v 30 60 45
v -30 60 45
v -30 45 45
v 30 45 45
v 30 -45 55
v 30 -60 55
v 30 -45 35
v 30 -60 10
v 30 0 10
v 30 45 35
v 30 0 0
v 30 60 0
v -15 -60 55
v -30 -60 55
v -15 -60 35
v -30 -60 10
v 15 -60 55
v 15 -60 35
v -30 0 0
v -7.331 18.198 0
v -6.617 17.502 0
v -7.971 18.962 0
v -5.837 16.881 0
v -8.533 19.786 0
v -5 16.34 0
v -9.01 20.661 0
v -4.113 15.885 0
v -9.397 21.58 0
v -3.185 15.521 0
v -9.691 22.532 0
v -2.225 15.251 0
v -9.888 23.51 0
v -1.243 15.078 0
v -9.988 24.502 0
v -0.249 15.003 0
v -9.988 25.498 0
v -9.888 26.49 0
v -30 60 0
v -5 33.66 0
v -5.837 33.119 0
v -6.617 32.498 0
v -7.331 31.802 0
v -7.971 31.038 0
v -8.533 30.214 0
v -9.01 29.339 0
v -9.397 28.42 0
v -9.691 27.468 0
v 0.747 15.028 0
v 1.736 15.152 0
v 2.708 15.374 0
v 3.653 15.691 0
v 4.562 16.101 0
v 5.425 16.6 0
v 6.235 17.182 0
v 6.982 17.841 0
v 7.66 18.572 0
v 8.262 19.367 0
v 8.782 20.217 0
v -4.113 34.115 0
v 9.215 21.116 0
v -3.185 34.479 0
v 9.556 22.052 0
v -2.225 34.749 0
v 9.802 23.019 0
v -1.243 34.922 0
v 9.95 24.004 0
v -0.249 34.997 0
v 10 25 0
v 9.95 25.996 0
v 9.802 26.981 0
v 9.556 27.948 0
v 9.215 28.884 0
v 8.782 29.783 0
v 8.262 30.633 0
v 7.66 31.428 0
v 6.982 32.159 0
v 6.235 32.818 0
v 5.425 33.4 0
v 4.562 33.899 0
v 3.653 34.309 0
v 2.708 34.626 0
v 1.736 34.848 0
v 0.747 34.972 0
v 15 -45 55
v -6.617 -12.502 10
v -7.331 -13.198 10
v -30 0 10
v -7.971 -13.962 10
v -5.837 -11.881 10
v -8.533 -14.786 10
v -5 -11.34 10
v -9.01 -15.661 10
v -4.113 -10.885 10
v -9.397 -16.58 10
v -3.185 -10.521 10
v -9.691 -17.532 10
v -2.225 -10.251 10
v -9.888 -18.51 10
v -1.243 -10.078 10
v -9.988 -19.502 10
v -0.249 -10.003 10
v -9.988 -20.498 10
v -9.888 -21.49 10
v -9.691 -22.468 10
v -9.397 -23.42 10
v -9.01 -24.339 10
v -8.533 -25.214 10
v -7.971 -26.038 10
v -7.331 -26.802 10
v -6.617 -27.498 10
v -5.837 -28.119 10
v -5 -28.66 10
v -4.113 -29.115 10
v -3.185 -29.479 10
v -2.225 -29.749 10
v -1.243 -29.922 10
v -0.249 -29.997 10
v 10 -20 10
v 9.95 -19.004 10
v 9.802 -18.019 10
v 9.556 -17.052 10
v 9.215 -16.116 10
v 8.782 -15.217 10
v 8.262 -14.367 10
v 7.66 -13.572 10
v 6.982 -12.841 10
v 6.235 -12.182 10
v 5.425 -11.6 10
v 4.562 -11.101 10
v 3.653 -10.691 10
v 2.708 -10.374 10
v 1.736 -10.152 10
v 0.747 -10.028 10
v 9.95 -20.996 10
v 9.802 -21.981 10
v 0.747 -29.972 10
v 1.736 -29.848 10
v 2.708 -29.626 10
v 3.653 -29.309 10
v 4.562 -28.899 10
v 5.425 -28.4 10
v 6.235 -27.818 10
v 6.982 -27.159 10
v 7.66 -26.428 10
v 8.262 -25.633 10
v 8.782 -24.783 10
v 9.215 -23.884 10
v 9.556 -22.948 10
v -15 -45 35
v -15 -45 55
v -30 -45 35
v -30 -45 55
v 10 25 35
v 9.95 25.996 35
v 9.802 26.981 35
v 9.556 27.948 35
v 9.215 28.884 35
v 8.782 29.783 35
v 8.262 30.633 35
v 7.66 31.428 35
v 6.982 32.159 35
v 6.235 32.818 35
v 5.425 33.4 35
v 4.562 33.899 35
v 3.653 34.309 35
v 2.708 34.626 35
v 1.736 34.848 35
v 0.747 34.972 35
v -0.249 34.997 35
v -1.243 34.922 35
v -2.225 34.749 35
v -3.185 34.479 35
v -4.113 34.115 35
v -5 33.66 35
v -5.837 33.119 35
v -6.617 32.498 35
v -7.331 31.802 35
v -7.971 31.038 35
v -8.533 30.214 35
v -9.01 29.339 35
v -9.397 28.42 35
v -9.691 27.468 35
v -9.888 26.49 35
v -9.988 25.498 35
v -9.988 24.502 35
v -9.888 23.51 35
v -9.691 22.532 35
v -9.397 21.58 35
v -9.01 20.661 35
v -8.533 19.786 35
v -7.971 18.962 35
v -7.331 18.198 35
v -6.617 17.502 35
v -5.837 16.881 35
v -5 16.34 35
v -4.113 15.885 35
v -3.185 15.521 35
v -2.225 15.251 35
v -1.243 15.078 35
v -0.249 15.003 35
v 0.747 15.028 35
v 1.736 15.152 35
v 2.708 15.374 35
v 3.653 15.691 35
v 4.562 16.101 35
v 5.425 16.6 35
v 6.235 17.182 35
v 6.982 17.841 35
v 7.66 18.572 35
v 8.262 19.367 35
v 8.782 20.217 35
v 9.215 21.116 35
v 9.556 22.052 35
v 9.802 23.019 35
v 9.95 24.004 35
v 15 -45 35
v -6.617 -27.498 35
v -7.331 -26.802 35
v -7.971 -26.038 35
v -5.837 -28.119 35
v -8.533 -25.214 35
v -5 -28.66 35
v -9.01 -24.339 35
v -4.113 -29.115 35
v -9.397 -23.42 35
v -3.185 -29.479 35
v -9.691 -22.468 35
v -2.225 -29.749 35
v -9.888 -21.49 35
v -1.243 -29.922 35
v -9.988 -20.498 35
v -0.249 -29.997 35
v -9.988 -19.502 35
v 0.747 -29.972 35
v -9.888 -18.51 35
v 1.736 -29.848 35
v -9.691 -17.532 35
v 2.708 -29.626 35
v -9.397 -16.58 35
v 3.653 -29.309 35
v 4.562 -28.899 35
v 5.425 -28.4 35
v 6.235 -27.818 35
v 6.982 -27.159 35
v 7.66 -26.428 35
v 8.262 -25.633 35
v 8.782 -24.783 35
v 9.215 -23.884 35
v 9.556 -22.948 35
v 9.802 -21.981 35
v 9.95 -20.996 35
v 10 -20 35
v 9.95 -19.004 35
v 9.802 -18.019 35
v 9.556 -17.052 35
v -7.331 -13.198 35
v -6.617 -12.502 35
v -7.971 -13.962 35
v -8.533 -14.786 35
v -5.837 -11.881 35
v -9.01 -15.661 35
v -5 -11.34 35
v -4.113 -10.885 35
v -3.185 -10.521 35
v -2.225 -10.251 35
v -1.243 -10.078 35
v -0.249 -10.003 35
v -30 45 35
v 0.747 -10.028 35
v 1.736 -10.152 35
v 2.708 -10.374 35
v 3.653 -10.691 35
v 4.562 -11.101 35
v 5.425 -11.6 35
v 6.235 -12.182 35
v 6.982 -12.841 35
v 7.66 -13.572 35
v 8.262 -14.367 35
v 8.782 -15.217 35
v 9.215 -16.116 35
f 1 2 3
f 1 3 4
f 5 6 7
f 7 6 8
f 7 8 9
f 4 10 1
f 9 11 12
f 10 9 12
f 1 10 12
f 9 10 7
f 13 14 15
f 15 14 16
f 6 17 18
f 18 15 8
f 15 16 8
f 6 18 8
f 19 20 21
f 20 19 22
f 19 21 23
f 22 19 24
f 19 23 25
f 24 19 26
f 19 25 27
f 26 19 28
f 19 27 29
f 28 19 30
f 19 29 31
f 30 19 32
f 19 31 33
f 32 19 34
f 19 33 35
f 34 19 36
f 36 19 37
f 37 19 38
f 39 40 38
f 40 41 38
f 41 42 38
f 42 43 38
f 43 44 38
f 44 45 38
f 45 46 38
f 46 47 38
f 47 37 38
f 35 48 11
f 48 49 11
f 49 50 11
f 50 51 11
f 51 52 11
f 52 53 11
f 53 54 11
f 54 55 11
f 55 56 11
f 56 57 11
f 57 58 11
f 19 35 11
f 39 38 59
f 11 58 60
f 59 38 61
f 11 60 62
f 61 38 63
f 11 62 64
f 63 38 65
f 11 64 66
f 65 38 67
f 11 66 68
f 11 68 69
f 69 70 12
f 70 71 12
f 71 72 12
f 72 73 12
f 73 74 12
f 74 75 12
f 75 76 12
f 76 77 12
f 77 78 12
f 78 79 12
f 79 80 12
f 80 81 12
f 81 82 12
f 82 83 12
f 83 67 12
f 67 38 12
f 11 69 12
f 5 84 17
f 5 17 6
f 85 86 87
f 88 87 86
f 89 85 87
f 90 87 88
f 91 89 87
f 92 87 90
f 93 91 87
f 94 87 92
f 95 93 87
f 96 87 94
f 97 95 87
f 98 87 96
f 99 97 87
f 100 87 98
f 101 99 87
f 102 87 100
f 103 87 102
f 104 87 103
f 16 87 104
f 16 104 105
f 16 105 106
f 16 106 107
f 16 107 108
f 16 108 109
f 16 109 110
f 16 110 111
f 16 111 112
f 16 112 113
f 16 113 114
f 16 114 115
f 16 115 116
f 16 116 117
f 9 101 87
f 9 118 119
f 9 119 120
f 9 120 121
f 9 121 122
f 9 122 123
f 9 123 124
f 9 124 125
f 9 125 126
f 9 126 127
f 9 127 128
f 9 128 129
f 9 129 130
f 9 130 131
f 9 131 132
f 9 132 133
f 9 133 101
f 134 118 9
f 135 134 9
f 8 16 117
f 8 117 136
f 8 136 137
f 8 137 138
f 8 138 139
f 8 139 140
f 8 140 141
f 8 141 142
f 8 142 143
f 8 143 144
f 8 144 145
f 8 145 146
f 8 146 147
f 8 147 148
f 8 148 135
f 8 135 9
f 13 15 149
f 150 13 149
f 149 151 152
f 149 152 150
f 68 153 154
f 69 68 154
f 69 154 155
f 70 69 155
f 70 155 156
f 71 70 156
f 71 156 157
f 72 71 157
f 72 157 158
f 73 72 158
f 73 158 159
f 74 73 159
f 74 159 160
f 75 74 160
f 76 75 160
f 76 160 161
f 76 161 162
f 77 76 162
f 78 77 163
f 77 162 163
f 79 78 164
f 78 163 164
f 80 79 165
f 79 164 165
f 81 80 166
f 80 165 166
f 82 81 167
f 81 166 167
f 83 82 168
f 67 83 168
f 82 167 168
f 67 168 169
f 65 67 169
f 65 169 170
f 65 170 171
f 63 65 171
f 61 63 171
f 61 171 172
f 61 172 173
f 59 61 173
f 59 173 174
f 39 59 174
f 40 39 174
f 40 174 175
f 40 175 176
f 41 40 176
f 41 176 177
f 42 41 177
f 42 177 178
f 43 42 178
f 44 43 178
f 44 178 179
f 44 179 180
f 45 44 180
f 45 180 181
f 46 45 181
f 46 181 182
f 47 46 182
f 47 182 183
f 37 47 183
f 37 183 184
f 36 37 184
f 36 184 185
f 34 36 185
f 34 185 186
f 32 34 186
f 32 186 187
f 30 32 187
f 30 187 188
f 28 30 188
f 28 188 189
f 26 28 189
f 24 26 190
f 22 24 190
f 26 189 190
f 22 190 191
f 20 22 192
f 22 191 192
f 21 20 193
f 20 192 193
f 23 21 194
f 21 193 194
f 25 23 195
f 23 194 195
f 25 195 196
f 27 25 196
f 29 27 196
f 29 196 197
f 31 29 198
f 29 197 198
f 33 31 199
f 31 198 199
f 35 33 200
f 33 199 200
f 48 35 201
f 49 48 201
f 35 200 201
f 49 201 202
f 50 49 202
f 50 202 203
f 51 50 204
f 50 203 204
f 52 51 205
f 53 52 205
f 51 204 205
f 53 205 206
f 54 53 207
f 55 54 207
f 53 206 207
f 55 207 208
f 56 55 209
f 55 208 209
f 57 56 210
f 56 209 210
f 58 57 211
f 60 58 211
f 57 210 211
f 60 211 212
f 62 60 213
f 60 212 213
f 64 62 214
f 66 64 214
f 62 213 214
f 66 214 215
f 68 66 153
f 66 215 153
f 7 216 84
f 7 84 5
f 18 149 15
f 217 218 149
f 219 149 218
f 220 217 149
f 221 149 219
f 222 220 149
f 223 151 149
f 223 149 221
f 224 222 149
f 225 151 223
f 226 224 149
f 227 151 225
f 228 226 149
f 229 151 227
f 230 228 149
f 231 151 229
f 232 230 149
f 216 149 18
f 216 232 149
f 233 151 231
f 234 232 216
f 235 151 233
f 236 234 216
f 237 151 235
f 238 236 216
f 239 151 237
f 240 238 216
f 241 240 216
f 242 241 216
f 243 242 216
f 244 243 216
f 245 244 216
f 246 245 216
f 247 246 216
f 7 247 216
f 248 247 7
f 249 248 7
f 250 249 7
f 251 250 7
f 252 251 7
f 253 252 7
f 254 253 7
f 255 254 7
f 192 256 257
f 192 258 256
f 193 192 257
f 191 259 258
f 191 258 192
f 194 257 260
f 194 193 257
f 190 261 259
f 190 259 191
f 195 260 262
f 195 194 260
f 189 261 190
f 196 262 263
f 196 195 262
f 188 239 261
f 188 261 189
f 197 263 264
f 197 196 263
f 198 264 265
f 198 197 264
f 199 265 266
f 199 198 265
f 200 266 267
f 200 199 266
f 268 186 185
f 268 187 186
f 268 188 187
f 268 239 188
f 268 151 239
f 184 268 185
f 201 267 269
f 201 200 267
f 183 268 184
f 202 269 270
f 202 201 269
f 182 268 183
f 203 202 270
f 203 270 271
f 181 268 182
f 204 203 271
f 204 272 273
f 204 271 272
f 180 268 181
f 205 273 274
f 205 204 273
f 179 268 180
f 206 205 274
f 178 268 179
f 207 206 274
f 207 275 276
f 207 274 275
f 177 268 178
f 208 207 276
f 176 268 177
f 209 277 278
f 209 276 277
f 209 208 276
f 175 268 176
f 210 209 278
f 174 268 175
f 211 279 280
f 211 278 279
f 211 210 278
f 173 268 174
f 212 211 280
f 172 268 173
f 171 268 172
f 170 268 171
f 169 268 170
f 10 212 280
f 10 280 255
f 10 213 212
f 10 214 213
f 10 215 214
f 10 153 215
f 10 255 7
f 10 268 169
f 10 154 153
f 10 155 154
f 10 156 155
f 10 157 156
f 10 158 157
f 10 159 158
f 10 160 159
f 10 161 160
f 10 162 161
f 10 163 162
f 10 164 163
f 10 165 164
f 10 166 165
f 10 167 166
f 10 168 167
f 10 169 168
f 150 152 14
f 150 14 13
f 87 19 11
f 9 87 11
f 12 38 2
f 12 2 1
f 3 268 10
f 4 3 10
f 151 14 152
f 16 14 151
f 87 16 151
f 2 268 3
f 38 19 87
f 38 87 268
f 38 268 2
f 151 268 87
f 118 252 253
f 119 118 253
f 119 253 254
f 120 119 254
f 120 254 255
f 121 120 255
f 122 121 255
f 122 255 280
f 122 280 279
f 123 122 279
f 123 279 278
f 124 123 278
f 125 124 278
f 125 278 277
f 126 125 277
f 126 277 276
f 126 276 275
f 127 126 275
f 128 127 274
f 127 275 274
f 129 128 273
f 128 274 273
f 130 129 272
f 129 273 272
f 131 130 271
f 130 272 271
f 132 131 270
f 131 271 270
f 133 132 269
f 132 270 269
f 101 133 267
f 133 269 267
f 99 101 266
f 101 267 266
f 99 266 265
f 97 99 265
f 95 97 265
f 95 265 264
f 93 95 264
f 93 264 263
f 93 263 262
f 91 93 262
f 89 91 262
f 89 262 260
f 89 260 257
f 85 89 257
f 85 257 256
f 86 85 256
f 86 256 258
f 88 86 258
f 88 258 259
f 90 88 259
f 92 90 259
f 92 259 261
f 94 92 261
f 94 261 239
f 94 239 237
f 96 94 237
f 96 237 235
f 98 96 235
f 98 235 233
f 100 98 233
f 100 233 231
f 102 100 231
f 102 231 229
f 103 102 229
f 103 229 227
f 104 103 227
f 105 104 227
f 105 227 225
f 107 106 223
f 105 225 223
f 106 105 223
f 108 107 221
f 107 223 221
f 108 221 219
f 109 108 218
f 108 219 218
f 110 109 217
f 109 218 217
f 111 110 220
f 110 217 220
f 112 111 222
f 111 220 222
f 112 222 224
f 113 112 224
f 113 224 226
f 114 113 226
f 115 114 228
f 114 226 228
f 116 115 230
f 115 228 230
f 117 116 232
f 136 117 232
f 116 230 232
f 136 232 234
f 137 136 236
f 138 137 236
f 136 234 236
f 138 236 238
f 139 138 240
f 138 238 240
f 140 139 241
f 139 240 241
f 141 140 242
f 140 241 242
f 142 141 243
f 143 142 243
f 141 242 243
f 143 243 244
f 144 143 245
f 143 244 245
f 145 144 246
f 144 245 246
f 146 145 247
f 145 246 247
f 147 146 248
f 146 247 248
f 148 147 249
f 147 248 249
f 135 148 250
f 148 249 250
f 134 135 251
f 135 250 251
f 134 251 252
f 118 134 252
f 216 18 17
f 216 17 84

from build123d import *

# Parameters (mm, degrees)
F0_W      = 60
F0_H      = 120
F1_DEPTH  = 35
F2_W      = 60
F2_H      = 15
F3_DEPTH  = 10
F4_W      = 60
F4_H      = 60
F5_DEPTH  = 10
F6_W      = 15
F6_H      = 15
F7_DEPTH  = 20
F8_W      = 15
F8_H      = 15
F9_DEPTH  = 20
F10_R     = 10
F11_DEPTH = 72.9
F12_R     = 10
F13_DEPTH = 66.7


with BuildPart() as f1:
    # F0 (on Top) → F1 (new body)
    with BuildSketch(Plane.XY):
        Rectangle(F0_W, F0_H)
    extrude(amount=F1_DEPTH)

    # F2 (on face) → F3 (join)
    with BuildSketch(Plane.XY.offset(35)):
        with Locations((0, 52.5)):
            Rectangle(F2_W, F2_H)
    extrude(amount=F3_DEPTH)

    # F4 (on face) → F5 (cut)
    with BuildSketch(Plane(origin=(0, 0, 0), x_dir=(1, 0, 0), z_dir=(0, 0, -1))):
        with Locations((0, 30)):
            Rectangle(F4_W, F4_H)
    extrude(amount=-F5_DEPTH, mode=Mode.SUBTRACT)

    # F6 (on face) → F7 (join)
    with BuildSketch(Plane.XY.offset(35)):
        with Locations((-22.5, -52.5)):
            Rectangle(F6_W, F6_H)
    extrude(amount=F7_DEPTH)

    # F8 (on face) → F9 (join)
    with BuildSketch(Plane.XY.offset(35)):
        with Locations((22.5, -52.5)):
            Rectangle(F8_W, F8_H)
    extrude(amount=F9_DEPTH)

    # F10 (on face) → F11 (cut)
    with BuildSketch(Plane.XY.offset(35)):
        with Locations((0, 25)):
            Circle(F10_R)
    extrude(amount=-F11_DEPTH, mode=Mode.SUBTRACT)

    # F12 (on face) → F13 (cut)
    with BuildSketch(Plane.XY.offset(35)):
        with Locations((0, -20)):
            Circle(F12_R)
    extrude(amount=-F13_DEPTH, mode=Mode.SUBTRACT)


solid = f1.part
